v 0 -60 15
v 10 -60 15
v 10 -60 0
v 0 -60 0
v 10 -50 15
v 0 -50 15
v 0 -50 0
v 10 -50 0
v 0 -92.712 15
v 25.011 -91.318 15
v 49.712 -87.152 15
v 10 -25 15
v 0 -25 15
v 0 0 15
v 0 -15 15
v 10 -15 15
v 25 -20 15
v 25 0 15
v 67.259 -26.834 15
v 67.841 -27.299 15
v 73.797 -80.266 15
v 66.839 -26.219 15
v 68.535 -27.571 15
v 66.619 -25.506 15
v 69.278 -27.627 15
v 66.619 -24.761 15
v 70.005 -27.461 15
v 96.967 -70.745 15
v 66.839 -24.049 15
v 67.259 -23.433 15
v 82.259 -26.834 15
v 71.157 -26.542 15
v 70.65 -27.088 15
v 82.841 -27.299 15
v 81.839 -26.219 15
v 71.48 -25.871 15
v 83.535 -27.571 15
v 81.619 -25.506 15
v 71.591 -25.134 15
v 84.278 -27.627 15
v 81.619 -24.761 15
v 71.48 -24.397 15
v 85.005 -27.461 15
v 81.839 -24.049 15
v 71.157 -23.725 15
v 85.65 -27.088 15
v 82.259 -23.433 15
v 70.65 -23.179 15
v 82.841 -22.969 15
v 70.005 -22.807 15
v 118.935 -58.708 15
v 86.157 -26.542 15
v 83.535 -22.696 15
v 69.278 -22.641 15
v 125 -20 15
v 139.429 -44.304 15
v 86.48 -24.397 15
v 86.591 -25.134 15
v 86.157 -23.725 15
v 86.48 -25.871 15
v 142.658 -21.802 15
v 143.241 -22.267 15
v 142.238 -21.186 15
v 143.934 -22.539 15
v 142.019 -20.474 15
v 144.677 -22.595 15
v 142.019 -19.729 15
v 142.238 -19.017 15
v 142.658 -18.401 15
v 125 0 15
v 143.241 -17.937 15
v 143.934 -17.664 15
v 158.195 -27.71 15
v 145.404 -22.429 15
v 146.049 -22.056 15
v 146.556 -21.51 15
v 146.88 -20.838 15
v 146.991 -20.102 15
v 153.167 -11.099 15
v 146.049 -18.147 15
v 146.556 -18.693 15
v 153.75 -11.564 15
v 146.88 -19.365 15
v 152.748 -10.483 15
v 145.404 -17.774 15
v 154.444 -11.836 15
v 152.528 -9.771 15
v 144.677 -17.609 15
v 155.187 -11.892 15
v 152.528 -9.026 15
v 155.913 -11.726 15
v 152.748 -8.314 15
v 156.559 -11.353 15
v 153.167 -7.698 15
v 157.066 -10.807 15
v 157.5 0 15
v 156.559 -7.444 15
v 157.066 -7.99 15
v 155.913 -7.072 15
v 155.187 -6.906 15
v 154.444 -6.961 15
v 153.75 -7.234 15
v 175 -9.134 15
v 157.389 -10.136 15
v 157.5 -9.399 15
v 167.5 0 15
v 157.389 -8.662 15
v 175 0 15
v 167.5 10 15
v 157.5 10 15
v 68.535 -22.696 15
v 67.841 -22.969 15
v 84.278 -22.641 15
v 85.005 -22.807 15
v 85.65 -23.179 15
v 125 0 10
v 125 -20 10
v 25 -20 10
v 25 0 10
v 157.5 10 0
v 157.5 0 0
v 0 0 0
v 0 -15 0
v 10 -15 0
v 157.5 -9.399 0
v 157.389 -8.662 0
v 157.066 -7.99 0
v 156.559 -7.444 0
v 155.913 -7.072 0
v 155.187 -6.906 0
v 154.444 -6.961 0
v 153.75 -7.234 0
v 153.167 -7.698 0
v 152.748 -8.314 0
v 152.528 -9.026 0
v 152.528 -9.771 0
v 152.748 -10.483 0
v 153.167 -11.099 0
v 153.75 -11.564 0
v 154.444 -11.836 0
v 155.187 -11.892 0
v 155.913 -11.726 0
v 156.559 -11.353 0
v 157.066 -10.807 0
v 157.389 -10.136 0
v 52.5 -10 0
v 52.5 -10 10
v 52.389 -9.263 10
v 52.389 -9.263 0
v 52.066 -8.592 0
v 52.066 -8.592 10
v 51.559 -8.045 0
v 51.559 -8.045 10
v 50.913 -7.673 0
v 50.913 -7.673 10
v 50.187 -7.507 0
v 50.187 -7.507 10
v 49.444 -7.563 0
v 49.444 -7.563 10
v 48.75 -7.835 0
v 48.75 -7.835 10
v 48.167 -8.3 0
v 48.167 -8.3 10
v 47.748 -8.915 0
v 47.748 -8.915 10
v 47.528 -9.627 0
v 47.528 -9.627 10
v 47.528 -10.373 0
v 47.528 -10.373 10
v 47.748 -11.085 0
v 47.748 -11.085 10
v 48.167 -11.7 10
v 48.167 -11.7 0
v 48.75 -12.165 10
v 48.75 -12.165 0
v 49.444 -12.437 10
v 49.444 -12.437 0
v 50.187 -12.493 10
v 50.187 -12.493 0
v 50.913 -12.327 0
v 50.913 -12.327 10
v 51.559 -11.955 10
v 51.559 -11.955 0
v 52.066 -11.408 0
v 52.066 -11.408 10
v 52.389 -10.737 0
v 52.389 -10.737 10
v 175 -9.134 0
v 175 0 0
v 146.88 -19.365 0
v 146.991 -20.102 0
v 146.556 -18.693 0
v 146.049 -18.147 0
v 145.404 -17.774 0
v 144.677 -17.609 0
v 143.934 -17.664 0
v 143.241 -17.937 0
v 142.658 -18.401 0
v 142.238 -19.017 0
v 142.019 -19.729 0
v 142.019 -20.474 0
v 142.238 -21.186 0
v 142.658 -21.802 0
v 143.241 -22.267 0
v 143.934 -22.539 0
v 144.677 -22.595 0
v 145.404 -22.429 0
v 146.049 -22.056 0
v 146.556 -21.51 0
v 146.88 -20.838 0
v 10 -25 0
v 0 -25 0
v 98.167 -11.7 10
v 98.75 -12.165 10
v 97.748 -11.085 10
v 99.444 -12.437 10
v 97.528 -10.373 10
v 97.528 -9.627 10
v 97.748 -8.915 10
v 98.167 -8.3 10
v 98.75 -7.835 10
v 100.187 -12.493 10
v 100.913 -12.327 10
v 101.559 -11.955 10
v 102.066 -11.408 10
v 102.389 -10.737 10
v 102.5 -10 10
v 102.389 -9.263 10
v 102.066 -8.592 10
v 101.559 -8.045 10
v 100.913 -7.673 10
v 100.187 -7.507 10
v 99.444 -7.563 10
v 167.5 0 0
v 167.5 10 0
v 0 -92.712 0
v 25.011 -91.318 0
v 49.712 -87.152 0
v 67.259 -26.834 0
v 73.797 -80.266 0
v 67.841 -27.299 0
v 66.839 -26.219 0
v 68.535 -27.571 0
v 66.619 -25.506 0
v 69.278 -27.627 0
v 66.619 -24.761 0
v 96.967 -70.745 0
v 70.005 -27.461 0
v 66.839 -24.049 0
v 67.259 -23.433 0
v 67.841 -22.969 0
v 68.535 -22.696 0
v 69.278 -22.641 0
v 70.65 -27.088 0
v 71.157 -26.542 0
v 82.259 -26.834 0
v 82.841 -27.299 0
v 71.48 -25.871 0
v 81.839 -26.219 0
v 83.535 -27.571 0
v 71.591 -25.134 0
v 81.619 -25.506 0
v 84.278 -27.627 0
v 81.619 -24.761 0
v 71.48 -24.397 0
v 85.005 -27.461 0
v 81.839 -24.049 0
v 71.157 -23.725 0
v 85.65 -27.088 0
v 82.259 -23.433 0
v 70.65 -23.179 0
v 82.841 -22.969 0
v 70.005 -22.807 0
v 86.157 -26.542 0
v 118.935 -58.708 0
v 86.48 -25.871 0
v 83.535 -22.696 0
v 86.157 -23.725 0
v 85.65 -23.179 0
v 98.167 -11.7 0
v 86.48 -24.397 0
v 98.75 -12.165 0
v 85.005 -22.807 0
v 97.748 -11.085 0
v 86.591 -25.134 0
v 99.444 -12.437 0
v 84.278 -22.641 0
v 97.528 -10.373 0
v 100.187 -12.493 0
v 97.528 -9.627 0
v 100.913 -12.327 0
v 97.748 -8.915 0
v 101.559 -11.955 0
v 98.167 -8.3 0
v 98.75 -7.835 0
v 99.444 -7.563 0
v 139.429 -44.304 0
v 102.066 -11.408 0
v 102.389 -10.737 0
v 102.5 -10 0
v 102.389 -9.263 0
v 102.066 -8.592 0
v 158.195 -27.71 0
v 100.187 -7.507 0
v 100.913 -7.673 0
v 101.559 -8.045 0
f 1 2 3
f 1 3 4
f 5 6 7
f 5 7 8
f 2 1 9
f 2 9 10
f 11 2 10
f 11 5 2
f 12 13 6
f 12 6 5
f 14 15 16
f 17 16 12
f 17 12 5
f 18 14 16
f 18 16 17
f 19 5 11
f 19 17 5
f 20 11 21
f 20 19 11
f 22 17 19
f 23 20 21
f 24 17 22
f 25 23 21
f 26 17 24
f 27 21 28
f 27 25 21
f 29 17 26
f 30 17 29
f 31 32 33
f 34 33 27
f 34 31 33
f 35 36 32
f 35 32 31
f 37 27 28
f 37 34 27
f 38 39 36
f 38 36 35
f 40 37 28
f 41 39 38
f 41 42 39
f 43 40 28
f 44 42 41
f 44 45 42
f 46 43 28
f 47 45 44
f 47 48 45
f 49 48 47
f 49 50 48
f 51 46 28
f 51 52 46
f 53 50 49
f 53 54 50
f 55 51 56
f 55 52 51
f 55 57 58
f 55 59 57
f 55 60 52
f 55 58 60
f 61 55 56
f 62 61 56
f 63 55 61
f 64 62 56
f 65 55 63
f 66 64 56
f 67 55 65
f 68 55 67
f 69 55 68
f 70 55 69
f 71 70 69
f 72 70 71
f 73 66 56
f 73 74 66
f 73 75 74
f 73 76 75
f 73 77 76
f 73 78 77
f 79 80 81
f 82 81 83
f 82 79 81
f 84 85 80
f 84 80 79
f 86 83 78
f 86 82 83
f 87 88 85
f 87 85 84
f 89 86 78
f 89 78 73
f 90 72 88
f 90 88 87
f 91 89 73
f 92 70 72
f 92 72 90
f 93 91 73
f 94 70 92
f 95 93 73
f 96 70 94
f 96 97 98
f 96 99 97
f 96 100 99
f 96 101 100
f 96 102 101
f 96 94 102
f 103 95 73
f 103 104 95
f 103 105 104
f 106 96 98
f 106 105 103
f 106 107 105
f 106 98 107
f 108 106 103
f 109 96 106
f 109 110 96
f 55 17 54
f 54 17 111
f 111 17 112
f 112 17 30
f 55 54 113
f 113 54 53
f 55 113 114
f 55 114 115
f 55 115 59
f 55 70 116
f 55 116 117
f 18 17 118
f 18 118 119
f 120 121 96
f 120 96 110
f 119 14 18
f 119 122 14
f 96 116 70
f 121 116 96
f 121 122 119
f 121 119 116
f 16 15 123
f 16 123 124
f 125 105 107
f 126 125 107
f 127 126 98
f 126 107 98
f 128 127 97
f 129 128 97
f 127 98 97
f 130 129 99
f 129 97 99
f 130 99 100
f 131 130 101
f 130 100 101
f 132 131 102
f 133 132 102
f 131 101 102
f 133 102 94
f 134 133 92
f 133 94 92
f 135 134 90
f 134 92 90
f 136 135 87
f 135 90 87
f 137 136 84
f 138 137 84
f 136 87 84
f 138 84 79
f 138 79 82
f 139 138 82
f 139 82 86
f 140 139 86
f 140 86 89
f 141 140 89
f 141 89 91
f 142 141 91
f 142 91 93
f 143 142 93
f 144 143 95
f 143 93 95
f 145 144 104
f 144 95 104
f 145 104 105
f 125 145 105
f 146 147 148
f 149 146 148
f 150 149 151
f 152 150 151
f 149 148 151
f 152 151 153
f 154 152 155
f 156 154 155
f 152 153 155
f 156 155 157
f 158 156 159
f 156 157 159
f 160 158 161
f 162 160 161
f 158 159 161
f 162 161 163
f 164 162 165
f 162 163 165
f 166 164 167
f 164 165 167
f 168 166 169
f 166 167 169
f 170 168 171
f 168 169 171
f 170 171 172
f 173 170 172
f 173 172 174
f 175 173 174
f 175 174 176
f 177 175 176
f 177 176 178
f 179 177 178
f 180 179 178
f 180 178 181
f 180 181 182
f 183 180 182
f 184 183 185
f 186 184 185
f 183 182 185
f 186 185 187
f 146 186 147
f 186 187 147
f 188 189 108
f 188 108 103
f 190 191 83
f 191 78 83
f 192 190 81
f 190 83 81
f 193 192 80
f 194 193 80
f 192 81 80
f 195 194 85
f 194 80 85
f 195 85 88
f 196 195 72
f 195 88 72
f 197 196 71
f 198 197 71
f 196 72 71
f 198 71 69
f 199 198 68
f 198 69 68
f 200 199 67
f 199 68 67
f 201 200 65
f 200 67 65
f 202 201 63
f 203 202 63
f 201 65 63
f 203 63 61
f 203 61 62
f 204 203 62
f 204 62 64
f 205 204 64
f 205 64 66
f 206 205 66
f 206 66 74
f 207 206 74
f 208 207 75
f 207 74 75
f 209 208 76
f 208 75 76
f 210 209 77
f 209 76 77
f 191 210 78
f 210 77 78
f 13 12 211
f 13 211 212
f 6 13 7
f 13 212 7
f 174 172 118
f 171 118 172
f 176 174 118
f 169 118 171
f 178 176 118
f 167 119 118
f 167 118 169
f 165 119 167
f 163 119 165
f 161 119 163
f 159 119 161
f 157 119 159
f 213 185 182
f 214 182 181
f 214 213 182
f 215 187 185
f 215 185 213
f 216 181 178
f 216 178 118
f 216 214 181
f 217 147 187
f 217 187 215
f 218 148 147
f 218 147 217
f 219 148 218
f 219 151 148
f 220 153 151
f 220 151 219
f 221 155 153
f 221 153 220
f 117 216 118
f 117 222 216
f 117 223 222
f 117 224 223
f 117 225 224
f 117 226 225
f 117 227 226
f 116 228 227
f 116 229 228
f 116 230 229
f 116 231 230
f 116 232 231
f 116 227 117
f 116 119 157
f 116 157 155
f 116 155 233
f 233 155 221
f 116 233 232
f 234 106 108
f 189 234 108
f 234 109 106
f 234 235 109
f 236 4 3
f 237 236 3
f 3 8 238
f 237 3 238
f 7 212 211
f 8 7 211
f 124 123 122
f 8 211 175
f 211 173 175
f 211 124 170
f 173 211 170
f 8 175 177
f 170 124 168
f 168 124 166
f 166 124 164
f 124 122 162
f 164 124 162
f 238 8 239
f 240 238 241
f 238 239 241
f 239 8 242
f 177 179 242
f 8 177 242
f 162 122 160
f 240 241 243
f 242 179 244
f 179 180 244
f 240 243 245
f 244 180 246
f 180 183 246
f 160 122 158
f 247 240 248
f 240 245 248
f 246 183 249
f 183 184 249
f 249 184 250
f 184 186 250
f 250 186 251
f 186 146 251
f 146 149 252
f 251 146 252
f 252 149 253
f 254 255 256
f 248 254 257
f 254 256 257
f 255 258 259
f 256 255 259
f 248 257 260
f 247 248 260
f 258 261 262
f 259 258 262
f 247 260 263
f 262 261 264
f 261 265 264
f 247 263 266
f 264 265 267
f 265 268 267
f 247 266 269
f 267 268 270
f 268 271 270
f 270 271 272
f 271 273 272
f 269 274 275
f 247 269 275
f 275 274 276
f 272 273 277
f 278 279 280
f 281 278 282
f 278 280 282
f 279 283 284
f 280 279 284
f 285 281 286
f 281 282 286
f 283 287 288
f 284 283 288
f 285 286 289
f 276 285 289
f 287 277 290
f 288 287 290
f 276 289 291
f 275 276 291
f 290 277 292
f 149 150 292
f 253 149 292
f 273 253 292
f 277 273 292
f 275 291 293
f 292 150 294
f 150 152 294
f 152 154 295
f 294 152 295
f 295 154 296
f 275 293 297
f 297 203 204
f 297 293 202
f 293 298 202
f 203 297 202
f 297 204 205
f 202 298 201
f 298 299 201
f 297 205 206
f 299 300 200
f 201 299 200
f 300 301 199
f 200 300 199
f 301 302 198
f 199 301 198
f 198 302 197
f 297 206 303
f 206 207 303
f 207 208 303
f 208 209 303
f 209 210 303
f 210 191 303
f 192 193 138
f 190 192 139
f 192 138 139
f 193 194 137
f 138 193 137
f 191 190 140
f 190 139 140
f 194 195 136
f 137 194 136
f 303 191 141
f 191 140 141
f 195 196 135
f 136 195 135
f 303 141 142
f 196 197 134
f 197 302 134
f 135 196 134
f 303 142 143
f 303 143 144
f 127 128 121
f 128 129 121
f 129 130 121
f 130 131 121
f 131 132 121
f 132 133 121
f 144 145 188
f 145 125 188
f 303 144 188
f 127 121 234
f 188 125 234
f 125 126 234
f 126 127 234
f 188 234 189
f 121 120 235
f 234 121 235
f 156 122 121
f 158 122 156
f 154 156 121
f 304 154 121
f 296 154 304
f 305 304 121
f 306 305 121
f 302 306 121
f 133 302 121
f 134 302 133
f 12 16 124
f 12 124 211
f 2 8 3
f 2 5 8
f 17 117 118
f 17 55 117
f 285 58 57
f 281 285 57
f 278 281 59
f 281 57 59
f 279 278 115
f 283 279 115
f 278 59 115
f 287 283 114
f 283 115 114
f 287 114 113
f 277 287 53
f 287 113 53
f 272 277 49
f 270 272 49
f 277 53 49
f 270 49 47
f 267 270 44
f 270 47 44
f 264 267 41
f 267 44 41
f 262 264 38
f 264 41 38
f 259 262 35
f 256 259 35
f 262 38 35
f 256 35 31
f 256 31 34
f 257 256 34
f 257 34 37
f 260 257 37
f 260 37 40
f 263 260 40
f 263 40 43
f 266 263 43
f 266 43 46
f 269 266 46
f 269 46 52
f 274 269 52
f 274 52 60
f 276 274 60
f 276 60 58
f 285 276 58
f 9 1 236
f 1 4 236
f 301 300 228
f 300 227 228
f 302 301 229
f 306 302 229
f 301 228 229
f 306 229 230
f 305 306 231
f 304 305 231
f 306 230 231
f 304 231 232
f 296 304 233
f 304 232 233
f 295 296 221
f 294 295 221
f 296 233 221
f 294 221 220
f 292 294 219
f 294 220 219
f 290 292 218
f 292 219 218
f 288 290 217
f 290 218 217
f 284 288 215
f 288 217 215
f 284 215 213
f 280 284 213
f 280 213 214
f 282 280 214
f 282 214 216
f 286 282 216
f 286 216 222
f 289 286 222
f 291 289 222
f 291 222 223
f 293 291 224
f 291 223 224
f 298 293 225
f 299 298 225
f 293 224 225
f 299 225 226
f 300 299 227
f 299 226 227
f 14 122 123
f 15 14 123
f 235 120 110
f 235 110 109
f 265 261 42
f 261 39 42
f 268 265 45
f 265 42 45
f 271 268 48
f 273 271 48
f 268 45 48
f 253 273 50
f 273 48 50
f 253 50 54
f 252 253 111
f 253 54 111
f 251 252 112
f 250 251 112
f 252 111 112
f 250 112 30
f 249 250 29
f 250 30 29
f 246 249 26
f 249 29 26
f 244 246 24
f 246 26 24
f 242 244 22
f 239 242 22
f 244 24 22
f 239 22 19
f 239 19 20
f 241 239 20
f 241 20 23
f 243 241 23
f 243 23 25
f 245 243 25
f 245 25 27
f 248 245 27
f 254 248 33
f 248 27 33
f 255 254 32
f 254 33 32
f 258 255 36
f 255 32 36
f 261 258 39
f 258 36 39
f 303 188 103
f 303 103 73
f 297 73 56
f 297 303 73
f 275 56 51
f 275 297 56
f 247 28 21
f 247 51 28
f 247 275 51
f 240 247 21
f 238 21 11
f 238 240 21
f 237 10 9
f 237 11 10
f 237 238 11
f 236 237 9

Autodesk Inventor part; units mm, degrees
ref_plane "YZ Plane" through (0, 0, 0) normal (1, 0, 0) x (0, 1, 0)
ref_plane "XZ Plane" through (0, 0, 0) normal (0, 1, 0) x (-1, 0, 0)
ref_plane "XY Plane" through (0, 0, 0) normal (0, 0, 1) x (1, 0, 0)
sketch "Sketch1" plane through (0, 0, 0) normal (0, 0, 1) x (1, 0, 0)
  circle A0 centre (0, 132.2876) radius 225 construction
  circle A1 centre (0, 132.2876) radius 200 construction
  line L0 (150, 132.2876) -> (150, 0) construction
  line L1 (150, 0) -> (0, 0)
  line L2 (0, 0) -> (0, -92.7124)
  arc A2 (0, -92.7124) -> (175, -9.1338) centre (0, 132.2876) ccw
  line L3 (157.5, 0) -> (157.5, 10)
  line L4 (157.5, 10) -> (167.5, 10)
  line L5 (167.5, 10) -> (167.5, 0)
  line L6 (150, 0) -> (157.5, 0)
  line L7 (175, -35.9935) -> (175, -9.1338) construction
  line L8 (175, 0) -> (175, -9.1338)
  line L9 (167.5, 0) -> (175, 0)
  line L10 (0, 132.2876) -> (0, -92.7124) construction
  line L11 (0, 132.2876) -> (225, 132.2876) construction
  line L12 (0, 0) -> (130.6185, 0) construction
  dimension "d0" = 450
  dimension "d1" = 25
  dimension "d3" = 10
  dimension "d4" = 10
  dimension "d6" = 7.5
  dimension "d7" = 90
  dimension "d9" = 25
  dimension "d12" = 90
  dimension "d13" = 75
  dimension "d14" = 90
extrude "Extrusion1" add sketch "Sketch1" along normal blind 15
sketch "Sketch2" plane through (0, 0, 15) normal (0, 0, 1) x (1, 0, 0)
  line L0 (0, 0) -> (0, -92.7124) projected
  line L1 (0, -15) -> (10, -15)
  line L2 (10, -15) -> (10, -25)
  line L3 (10, -25) -> (0, -25)
  line L4 (0, -25) -> (0, -15)
  line L5 (0, -50) -> (10, -50)
  line L6 (10, -50) -> (10, -60)
  line L7 (10, -60) -> (0, -60)
  line L8 (0, -60) -> (0, -50)
  line L9 (157.5, 0) -> (0, 0) projected
  dimension "d15" = 10
  dimension "d16" = 10
  dimension "d17" = 10
  dimension "d18" = 10
  dimension "d19" = 25
  dimension "d20" = 15
extrude "Extrusion2" cut sketch "Sketch2" against normal blind 15
sketch "Sketch3" plane through (0, 0, 15) normal (0, 0, 1) x (1, 0, 0)
  line L0 (157.5, 0) -> (0, 0) construction
  line L1 (25, 0) -> (125, 0) construction
  line L2 (125, 0) -> (125, -20) construction
  line L3 (125, -20) -> (25, -20) construction
  line L4 (25, -20) -> (25, 0) construction
  circle A0 centre (50, -10) radius 2.5
  circle A1 centre (100, -10) radius 2.5
  dimension "d23" = 100
  dimension "d24" = 20
  dimension "d25" = 25
  dimension "d26" = 5
  dimension "d27" = 5
  dimension "d28" = 25
  dimension "d29" = 25
extrude "Extrusion3" cut sketch "Sketch3" against normal through all
thread "Thread1" size "M5x0.8" class "6H" standard "ANSI Metric M Profile" full length
thread "Thread2" size "M5x0.8" class "6H" standard "ANSI Metric M Profile" full length
sketch "Sketch4" plane through (0, 0, 15) normal (0, 0, 1) x (1, 0, 0)
  line L0 (157.5, 0) -> (0, 0) projected
  line L1 (25, 0) -> (125, 0)
  line L2 (125, 0) -> (125, -20)
  line L3 (125, -20) -> (25, -20)
  line L4 (25, -20) -> (25, 0)
  dimension "d36" = 100
  dimension "d37" = 20
  dimension "d38" = 25
extrude "Extrusion4" cut sketch "Sketch4" against normal blind 5
sketch "Sketch5" plane through (0, 0, 15) normal (0, 0, 1) x (1, 0, 0)
  circle A0 centre (0, 132.2876) radius 225 construction
  arc A1 (0, -92.7124) -> (175, -9.1338) centre (0, 132.2876) ccw construction
  circle A2 centre (0, 132.2876) radius 210 construction
  circle A3 centre (144.4906, -20.1016) radius 2.5
  circle A4 centre (155, -9.3987) radius 2.5
  line L0 (175, -9.1338) -> (175, 0) projected
  point P0 (0, 0)
  dimension "d41" = 450
  dimension "d42" = 15
  dimension "d43" = 5
  dimension "d44" = 5
  dimension "d45" = 15
  dimension "d46" = 20
extrude "Extrusion5" cut sketch "Sketch5" against normal through all
thread "Thread3" size "M5x0.8" class "6H" standard "ANSI Metric M Profile" full length
thread "Thread4" size "M5x0.8" class "6H" standard "ANSI Metric M Profile" full length
sketch "Sketch6" plane through (0, 0, 15) normal (0, 0, 1) x (1, 0, 0)
  circle A0 centre (69.0912, -25.1338) radius 2.5
  circle A1 centre (84.0912, -25.1338) radius 2.5
  line L0 (25, 0) -> (125, 0) projected
  arc A2 (0, -92.7124) -> (175, -9.1338) centre (0, 132.2876) ccw construction
  line L1 (175, -9.1338) -> (-10.7224, -9.1338) construction
  line L2 (0, 0) -> (0, -15) construction
  dimension "d53" = 5
  dimension "d54" = 5
  dimension "d56" = 16
  dimension "d57" = 69.0912
  dimension "d58" = 15
extrude "Extrusion6" cut sketch "Sketch6" against normal through all
thread "Thread5" size "M5x0.8" class "6H" standard "ANSI Metric M Profile" full length
thread "Thread6" size "M5x0.8" class "6H" standard "ANSI Metric M Profile" full length
properties part number "CP003" material "ABS Plastic"
